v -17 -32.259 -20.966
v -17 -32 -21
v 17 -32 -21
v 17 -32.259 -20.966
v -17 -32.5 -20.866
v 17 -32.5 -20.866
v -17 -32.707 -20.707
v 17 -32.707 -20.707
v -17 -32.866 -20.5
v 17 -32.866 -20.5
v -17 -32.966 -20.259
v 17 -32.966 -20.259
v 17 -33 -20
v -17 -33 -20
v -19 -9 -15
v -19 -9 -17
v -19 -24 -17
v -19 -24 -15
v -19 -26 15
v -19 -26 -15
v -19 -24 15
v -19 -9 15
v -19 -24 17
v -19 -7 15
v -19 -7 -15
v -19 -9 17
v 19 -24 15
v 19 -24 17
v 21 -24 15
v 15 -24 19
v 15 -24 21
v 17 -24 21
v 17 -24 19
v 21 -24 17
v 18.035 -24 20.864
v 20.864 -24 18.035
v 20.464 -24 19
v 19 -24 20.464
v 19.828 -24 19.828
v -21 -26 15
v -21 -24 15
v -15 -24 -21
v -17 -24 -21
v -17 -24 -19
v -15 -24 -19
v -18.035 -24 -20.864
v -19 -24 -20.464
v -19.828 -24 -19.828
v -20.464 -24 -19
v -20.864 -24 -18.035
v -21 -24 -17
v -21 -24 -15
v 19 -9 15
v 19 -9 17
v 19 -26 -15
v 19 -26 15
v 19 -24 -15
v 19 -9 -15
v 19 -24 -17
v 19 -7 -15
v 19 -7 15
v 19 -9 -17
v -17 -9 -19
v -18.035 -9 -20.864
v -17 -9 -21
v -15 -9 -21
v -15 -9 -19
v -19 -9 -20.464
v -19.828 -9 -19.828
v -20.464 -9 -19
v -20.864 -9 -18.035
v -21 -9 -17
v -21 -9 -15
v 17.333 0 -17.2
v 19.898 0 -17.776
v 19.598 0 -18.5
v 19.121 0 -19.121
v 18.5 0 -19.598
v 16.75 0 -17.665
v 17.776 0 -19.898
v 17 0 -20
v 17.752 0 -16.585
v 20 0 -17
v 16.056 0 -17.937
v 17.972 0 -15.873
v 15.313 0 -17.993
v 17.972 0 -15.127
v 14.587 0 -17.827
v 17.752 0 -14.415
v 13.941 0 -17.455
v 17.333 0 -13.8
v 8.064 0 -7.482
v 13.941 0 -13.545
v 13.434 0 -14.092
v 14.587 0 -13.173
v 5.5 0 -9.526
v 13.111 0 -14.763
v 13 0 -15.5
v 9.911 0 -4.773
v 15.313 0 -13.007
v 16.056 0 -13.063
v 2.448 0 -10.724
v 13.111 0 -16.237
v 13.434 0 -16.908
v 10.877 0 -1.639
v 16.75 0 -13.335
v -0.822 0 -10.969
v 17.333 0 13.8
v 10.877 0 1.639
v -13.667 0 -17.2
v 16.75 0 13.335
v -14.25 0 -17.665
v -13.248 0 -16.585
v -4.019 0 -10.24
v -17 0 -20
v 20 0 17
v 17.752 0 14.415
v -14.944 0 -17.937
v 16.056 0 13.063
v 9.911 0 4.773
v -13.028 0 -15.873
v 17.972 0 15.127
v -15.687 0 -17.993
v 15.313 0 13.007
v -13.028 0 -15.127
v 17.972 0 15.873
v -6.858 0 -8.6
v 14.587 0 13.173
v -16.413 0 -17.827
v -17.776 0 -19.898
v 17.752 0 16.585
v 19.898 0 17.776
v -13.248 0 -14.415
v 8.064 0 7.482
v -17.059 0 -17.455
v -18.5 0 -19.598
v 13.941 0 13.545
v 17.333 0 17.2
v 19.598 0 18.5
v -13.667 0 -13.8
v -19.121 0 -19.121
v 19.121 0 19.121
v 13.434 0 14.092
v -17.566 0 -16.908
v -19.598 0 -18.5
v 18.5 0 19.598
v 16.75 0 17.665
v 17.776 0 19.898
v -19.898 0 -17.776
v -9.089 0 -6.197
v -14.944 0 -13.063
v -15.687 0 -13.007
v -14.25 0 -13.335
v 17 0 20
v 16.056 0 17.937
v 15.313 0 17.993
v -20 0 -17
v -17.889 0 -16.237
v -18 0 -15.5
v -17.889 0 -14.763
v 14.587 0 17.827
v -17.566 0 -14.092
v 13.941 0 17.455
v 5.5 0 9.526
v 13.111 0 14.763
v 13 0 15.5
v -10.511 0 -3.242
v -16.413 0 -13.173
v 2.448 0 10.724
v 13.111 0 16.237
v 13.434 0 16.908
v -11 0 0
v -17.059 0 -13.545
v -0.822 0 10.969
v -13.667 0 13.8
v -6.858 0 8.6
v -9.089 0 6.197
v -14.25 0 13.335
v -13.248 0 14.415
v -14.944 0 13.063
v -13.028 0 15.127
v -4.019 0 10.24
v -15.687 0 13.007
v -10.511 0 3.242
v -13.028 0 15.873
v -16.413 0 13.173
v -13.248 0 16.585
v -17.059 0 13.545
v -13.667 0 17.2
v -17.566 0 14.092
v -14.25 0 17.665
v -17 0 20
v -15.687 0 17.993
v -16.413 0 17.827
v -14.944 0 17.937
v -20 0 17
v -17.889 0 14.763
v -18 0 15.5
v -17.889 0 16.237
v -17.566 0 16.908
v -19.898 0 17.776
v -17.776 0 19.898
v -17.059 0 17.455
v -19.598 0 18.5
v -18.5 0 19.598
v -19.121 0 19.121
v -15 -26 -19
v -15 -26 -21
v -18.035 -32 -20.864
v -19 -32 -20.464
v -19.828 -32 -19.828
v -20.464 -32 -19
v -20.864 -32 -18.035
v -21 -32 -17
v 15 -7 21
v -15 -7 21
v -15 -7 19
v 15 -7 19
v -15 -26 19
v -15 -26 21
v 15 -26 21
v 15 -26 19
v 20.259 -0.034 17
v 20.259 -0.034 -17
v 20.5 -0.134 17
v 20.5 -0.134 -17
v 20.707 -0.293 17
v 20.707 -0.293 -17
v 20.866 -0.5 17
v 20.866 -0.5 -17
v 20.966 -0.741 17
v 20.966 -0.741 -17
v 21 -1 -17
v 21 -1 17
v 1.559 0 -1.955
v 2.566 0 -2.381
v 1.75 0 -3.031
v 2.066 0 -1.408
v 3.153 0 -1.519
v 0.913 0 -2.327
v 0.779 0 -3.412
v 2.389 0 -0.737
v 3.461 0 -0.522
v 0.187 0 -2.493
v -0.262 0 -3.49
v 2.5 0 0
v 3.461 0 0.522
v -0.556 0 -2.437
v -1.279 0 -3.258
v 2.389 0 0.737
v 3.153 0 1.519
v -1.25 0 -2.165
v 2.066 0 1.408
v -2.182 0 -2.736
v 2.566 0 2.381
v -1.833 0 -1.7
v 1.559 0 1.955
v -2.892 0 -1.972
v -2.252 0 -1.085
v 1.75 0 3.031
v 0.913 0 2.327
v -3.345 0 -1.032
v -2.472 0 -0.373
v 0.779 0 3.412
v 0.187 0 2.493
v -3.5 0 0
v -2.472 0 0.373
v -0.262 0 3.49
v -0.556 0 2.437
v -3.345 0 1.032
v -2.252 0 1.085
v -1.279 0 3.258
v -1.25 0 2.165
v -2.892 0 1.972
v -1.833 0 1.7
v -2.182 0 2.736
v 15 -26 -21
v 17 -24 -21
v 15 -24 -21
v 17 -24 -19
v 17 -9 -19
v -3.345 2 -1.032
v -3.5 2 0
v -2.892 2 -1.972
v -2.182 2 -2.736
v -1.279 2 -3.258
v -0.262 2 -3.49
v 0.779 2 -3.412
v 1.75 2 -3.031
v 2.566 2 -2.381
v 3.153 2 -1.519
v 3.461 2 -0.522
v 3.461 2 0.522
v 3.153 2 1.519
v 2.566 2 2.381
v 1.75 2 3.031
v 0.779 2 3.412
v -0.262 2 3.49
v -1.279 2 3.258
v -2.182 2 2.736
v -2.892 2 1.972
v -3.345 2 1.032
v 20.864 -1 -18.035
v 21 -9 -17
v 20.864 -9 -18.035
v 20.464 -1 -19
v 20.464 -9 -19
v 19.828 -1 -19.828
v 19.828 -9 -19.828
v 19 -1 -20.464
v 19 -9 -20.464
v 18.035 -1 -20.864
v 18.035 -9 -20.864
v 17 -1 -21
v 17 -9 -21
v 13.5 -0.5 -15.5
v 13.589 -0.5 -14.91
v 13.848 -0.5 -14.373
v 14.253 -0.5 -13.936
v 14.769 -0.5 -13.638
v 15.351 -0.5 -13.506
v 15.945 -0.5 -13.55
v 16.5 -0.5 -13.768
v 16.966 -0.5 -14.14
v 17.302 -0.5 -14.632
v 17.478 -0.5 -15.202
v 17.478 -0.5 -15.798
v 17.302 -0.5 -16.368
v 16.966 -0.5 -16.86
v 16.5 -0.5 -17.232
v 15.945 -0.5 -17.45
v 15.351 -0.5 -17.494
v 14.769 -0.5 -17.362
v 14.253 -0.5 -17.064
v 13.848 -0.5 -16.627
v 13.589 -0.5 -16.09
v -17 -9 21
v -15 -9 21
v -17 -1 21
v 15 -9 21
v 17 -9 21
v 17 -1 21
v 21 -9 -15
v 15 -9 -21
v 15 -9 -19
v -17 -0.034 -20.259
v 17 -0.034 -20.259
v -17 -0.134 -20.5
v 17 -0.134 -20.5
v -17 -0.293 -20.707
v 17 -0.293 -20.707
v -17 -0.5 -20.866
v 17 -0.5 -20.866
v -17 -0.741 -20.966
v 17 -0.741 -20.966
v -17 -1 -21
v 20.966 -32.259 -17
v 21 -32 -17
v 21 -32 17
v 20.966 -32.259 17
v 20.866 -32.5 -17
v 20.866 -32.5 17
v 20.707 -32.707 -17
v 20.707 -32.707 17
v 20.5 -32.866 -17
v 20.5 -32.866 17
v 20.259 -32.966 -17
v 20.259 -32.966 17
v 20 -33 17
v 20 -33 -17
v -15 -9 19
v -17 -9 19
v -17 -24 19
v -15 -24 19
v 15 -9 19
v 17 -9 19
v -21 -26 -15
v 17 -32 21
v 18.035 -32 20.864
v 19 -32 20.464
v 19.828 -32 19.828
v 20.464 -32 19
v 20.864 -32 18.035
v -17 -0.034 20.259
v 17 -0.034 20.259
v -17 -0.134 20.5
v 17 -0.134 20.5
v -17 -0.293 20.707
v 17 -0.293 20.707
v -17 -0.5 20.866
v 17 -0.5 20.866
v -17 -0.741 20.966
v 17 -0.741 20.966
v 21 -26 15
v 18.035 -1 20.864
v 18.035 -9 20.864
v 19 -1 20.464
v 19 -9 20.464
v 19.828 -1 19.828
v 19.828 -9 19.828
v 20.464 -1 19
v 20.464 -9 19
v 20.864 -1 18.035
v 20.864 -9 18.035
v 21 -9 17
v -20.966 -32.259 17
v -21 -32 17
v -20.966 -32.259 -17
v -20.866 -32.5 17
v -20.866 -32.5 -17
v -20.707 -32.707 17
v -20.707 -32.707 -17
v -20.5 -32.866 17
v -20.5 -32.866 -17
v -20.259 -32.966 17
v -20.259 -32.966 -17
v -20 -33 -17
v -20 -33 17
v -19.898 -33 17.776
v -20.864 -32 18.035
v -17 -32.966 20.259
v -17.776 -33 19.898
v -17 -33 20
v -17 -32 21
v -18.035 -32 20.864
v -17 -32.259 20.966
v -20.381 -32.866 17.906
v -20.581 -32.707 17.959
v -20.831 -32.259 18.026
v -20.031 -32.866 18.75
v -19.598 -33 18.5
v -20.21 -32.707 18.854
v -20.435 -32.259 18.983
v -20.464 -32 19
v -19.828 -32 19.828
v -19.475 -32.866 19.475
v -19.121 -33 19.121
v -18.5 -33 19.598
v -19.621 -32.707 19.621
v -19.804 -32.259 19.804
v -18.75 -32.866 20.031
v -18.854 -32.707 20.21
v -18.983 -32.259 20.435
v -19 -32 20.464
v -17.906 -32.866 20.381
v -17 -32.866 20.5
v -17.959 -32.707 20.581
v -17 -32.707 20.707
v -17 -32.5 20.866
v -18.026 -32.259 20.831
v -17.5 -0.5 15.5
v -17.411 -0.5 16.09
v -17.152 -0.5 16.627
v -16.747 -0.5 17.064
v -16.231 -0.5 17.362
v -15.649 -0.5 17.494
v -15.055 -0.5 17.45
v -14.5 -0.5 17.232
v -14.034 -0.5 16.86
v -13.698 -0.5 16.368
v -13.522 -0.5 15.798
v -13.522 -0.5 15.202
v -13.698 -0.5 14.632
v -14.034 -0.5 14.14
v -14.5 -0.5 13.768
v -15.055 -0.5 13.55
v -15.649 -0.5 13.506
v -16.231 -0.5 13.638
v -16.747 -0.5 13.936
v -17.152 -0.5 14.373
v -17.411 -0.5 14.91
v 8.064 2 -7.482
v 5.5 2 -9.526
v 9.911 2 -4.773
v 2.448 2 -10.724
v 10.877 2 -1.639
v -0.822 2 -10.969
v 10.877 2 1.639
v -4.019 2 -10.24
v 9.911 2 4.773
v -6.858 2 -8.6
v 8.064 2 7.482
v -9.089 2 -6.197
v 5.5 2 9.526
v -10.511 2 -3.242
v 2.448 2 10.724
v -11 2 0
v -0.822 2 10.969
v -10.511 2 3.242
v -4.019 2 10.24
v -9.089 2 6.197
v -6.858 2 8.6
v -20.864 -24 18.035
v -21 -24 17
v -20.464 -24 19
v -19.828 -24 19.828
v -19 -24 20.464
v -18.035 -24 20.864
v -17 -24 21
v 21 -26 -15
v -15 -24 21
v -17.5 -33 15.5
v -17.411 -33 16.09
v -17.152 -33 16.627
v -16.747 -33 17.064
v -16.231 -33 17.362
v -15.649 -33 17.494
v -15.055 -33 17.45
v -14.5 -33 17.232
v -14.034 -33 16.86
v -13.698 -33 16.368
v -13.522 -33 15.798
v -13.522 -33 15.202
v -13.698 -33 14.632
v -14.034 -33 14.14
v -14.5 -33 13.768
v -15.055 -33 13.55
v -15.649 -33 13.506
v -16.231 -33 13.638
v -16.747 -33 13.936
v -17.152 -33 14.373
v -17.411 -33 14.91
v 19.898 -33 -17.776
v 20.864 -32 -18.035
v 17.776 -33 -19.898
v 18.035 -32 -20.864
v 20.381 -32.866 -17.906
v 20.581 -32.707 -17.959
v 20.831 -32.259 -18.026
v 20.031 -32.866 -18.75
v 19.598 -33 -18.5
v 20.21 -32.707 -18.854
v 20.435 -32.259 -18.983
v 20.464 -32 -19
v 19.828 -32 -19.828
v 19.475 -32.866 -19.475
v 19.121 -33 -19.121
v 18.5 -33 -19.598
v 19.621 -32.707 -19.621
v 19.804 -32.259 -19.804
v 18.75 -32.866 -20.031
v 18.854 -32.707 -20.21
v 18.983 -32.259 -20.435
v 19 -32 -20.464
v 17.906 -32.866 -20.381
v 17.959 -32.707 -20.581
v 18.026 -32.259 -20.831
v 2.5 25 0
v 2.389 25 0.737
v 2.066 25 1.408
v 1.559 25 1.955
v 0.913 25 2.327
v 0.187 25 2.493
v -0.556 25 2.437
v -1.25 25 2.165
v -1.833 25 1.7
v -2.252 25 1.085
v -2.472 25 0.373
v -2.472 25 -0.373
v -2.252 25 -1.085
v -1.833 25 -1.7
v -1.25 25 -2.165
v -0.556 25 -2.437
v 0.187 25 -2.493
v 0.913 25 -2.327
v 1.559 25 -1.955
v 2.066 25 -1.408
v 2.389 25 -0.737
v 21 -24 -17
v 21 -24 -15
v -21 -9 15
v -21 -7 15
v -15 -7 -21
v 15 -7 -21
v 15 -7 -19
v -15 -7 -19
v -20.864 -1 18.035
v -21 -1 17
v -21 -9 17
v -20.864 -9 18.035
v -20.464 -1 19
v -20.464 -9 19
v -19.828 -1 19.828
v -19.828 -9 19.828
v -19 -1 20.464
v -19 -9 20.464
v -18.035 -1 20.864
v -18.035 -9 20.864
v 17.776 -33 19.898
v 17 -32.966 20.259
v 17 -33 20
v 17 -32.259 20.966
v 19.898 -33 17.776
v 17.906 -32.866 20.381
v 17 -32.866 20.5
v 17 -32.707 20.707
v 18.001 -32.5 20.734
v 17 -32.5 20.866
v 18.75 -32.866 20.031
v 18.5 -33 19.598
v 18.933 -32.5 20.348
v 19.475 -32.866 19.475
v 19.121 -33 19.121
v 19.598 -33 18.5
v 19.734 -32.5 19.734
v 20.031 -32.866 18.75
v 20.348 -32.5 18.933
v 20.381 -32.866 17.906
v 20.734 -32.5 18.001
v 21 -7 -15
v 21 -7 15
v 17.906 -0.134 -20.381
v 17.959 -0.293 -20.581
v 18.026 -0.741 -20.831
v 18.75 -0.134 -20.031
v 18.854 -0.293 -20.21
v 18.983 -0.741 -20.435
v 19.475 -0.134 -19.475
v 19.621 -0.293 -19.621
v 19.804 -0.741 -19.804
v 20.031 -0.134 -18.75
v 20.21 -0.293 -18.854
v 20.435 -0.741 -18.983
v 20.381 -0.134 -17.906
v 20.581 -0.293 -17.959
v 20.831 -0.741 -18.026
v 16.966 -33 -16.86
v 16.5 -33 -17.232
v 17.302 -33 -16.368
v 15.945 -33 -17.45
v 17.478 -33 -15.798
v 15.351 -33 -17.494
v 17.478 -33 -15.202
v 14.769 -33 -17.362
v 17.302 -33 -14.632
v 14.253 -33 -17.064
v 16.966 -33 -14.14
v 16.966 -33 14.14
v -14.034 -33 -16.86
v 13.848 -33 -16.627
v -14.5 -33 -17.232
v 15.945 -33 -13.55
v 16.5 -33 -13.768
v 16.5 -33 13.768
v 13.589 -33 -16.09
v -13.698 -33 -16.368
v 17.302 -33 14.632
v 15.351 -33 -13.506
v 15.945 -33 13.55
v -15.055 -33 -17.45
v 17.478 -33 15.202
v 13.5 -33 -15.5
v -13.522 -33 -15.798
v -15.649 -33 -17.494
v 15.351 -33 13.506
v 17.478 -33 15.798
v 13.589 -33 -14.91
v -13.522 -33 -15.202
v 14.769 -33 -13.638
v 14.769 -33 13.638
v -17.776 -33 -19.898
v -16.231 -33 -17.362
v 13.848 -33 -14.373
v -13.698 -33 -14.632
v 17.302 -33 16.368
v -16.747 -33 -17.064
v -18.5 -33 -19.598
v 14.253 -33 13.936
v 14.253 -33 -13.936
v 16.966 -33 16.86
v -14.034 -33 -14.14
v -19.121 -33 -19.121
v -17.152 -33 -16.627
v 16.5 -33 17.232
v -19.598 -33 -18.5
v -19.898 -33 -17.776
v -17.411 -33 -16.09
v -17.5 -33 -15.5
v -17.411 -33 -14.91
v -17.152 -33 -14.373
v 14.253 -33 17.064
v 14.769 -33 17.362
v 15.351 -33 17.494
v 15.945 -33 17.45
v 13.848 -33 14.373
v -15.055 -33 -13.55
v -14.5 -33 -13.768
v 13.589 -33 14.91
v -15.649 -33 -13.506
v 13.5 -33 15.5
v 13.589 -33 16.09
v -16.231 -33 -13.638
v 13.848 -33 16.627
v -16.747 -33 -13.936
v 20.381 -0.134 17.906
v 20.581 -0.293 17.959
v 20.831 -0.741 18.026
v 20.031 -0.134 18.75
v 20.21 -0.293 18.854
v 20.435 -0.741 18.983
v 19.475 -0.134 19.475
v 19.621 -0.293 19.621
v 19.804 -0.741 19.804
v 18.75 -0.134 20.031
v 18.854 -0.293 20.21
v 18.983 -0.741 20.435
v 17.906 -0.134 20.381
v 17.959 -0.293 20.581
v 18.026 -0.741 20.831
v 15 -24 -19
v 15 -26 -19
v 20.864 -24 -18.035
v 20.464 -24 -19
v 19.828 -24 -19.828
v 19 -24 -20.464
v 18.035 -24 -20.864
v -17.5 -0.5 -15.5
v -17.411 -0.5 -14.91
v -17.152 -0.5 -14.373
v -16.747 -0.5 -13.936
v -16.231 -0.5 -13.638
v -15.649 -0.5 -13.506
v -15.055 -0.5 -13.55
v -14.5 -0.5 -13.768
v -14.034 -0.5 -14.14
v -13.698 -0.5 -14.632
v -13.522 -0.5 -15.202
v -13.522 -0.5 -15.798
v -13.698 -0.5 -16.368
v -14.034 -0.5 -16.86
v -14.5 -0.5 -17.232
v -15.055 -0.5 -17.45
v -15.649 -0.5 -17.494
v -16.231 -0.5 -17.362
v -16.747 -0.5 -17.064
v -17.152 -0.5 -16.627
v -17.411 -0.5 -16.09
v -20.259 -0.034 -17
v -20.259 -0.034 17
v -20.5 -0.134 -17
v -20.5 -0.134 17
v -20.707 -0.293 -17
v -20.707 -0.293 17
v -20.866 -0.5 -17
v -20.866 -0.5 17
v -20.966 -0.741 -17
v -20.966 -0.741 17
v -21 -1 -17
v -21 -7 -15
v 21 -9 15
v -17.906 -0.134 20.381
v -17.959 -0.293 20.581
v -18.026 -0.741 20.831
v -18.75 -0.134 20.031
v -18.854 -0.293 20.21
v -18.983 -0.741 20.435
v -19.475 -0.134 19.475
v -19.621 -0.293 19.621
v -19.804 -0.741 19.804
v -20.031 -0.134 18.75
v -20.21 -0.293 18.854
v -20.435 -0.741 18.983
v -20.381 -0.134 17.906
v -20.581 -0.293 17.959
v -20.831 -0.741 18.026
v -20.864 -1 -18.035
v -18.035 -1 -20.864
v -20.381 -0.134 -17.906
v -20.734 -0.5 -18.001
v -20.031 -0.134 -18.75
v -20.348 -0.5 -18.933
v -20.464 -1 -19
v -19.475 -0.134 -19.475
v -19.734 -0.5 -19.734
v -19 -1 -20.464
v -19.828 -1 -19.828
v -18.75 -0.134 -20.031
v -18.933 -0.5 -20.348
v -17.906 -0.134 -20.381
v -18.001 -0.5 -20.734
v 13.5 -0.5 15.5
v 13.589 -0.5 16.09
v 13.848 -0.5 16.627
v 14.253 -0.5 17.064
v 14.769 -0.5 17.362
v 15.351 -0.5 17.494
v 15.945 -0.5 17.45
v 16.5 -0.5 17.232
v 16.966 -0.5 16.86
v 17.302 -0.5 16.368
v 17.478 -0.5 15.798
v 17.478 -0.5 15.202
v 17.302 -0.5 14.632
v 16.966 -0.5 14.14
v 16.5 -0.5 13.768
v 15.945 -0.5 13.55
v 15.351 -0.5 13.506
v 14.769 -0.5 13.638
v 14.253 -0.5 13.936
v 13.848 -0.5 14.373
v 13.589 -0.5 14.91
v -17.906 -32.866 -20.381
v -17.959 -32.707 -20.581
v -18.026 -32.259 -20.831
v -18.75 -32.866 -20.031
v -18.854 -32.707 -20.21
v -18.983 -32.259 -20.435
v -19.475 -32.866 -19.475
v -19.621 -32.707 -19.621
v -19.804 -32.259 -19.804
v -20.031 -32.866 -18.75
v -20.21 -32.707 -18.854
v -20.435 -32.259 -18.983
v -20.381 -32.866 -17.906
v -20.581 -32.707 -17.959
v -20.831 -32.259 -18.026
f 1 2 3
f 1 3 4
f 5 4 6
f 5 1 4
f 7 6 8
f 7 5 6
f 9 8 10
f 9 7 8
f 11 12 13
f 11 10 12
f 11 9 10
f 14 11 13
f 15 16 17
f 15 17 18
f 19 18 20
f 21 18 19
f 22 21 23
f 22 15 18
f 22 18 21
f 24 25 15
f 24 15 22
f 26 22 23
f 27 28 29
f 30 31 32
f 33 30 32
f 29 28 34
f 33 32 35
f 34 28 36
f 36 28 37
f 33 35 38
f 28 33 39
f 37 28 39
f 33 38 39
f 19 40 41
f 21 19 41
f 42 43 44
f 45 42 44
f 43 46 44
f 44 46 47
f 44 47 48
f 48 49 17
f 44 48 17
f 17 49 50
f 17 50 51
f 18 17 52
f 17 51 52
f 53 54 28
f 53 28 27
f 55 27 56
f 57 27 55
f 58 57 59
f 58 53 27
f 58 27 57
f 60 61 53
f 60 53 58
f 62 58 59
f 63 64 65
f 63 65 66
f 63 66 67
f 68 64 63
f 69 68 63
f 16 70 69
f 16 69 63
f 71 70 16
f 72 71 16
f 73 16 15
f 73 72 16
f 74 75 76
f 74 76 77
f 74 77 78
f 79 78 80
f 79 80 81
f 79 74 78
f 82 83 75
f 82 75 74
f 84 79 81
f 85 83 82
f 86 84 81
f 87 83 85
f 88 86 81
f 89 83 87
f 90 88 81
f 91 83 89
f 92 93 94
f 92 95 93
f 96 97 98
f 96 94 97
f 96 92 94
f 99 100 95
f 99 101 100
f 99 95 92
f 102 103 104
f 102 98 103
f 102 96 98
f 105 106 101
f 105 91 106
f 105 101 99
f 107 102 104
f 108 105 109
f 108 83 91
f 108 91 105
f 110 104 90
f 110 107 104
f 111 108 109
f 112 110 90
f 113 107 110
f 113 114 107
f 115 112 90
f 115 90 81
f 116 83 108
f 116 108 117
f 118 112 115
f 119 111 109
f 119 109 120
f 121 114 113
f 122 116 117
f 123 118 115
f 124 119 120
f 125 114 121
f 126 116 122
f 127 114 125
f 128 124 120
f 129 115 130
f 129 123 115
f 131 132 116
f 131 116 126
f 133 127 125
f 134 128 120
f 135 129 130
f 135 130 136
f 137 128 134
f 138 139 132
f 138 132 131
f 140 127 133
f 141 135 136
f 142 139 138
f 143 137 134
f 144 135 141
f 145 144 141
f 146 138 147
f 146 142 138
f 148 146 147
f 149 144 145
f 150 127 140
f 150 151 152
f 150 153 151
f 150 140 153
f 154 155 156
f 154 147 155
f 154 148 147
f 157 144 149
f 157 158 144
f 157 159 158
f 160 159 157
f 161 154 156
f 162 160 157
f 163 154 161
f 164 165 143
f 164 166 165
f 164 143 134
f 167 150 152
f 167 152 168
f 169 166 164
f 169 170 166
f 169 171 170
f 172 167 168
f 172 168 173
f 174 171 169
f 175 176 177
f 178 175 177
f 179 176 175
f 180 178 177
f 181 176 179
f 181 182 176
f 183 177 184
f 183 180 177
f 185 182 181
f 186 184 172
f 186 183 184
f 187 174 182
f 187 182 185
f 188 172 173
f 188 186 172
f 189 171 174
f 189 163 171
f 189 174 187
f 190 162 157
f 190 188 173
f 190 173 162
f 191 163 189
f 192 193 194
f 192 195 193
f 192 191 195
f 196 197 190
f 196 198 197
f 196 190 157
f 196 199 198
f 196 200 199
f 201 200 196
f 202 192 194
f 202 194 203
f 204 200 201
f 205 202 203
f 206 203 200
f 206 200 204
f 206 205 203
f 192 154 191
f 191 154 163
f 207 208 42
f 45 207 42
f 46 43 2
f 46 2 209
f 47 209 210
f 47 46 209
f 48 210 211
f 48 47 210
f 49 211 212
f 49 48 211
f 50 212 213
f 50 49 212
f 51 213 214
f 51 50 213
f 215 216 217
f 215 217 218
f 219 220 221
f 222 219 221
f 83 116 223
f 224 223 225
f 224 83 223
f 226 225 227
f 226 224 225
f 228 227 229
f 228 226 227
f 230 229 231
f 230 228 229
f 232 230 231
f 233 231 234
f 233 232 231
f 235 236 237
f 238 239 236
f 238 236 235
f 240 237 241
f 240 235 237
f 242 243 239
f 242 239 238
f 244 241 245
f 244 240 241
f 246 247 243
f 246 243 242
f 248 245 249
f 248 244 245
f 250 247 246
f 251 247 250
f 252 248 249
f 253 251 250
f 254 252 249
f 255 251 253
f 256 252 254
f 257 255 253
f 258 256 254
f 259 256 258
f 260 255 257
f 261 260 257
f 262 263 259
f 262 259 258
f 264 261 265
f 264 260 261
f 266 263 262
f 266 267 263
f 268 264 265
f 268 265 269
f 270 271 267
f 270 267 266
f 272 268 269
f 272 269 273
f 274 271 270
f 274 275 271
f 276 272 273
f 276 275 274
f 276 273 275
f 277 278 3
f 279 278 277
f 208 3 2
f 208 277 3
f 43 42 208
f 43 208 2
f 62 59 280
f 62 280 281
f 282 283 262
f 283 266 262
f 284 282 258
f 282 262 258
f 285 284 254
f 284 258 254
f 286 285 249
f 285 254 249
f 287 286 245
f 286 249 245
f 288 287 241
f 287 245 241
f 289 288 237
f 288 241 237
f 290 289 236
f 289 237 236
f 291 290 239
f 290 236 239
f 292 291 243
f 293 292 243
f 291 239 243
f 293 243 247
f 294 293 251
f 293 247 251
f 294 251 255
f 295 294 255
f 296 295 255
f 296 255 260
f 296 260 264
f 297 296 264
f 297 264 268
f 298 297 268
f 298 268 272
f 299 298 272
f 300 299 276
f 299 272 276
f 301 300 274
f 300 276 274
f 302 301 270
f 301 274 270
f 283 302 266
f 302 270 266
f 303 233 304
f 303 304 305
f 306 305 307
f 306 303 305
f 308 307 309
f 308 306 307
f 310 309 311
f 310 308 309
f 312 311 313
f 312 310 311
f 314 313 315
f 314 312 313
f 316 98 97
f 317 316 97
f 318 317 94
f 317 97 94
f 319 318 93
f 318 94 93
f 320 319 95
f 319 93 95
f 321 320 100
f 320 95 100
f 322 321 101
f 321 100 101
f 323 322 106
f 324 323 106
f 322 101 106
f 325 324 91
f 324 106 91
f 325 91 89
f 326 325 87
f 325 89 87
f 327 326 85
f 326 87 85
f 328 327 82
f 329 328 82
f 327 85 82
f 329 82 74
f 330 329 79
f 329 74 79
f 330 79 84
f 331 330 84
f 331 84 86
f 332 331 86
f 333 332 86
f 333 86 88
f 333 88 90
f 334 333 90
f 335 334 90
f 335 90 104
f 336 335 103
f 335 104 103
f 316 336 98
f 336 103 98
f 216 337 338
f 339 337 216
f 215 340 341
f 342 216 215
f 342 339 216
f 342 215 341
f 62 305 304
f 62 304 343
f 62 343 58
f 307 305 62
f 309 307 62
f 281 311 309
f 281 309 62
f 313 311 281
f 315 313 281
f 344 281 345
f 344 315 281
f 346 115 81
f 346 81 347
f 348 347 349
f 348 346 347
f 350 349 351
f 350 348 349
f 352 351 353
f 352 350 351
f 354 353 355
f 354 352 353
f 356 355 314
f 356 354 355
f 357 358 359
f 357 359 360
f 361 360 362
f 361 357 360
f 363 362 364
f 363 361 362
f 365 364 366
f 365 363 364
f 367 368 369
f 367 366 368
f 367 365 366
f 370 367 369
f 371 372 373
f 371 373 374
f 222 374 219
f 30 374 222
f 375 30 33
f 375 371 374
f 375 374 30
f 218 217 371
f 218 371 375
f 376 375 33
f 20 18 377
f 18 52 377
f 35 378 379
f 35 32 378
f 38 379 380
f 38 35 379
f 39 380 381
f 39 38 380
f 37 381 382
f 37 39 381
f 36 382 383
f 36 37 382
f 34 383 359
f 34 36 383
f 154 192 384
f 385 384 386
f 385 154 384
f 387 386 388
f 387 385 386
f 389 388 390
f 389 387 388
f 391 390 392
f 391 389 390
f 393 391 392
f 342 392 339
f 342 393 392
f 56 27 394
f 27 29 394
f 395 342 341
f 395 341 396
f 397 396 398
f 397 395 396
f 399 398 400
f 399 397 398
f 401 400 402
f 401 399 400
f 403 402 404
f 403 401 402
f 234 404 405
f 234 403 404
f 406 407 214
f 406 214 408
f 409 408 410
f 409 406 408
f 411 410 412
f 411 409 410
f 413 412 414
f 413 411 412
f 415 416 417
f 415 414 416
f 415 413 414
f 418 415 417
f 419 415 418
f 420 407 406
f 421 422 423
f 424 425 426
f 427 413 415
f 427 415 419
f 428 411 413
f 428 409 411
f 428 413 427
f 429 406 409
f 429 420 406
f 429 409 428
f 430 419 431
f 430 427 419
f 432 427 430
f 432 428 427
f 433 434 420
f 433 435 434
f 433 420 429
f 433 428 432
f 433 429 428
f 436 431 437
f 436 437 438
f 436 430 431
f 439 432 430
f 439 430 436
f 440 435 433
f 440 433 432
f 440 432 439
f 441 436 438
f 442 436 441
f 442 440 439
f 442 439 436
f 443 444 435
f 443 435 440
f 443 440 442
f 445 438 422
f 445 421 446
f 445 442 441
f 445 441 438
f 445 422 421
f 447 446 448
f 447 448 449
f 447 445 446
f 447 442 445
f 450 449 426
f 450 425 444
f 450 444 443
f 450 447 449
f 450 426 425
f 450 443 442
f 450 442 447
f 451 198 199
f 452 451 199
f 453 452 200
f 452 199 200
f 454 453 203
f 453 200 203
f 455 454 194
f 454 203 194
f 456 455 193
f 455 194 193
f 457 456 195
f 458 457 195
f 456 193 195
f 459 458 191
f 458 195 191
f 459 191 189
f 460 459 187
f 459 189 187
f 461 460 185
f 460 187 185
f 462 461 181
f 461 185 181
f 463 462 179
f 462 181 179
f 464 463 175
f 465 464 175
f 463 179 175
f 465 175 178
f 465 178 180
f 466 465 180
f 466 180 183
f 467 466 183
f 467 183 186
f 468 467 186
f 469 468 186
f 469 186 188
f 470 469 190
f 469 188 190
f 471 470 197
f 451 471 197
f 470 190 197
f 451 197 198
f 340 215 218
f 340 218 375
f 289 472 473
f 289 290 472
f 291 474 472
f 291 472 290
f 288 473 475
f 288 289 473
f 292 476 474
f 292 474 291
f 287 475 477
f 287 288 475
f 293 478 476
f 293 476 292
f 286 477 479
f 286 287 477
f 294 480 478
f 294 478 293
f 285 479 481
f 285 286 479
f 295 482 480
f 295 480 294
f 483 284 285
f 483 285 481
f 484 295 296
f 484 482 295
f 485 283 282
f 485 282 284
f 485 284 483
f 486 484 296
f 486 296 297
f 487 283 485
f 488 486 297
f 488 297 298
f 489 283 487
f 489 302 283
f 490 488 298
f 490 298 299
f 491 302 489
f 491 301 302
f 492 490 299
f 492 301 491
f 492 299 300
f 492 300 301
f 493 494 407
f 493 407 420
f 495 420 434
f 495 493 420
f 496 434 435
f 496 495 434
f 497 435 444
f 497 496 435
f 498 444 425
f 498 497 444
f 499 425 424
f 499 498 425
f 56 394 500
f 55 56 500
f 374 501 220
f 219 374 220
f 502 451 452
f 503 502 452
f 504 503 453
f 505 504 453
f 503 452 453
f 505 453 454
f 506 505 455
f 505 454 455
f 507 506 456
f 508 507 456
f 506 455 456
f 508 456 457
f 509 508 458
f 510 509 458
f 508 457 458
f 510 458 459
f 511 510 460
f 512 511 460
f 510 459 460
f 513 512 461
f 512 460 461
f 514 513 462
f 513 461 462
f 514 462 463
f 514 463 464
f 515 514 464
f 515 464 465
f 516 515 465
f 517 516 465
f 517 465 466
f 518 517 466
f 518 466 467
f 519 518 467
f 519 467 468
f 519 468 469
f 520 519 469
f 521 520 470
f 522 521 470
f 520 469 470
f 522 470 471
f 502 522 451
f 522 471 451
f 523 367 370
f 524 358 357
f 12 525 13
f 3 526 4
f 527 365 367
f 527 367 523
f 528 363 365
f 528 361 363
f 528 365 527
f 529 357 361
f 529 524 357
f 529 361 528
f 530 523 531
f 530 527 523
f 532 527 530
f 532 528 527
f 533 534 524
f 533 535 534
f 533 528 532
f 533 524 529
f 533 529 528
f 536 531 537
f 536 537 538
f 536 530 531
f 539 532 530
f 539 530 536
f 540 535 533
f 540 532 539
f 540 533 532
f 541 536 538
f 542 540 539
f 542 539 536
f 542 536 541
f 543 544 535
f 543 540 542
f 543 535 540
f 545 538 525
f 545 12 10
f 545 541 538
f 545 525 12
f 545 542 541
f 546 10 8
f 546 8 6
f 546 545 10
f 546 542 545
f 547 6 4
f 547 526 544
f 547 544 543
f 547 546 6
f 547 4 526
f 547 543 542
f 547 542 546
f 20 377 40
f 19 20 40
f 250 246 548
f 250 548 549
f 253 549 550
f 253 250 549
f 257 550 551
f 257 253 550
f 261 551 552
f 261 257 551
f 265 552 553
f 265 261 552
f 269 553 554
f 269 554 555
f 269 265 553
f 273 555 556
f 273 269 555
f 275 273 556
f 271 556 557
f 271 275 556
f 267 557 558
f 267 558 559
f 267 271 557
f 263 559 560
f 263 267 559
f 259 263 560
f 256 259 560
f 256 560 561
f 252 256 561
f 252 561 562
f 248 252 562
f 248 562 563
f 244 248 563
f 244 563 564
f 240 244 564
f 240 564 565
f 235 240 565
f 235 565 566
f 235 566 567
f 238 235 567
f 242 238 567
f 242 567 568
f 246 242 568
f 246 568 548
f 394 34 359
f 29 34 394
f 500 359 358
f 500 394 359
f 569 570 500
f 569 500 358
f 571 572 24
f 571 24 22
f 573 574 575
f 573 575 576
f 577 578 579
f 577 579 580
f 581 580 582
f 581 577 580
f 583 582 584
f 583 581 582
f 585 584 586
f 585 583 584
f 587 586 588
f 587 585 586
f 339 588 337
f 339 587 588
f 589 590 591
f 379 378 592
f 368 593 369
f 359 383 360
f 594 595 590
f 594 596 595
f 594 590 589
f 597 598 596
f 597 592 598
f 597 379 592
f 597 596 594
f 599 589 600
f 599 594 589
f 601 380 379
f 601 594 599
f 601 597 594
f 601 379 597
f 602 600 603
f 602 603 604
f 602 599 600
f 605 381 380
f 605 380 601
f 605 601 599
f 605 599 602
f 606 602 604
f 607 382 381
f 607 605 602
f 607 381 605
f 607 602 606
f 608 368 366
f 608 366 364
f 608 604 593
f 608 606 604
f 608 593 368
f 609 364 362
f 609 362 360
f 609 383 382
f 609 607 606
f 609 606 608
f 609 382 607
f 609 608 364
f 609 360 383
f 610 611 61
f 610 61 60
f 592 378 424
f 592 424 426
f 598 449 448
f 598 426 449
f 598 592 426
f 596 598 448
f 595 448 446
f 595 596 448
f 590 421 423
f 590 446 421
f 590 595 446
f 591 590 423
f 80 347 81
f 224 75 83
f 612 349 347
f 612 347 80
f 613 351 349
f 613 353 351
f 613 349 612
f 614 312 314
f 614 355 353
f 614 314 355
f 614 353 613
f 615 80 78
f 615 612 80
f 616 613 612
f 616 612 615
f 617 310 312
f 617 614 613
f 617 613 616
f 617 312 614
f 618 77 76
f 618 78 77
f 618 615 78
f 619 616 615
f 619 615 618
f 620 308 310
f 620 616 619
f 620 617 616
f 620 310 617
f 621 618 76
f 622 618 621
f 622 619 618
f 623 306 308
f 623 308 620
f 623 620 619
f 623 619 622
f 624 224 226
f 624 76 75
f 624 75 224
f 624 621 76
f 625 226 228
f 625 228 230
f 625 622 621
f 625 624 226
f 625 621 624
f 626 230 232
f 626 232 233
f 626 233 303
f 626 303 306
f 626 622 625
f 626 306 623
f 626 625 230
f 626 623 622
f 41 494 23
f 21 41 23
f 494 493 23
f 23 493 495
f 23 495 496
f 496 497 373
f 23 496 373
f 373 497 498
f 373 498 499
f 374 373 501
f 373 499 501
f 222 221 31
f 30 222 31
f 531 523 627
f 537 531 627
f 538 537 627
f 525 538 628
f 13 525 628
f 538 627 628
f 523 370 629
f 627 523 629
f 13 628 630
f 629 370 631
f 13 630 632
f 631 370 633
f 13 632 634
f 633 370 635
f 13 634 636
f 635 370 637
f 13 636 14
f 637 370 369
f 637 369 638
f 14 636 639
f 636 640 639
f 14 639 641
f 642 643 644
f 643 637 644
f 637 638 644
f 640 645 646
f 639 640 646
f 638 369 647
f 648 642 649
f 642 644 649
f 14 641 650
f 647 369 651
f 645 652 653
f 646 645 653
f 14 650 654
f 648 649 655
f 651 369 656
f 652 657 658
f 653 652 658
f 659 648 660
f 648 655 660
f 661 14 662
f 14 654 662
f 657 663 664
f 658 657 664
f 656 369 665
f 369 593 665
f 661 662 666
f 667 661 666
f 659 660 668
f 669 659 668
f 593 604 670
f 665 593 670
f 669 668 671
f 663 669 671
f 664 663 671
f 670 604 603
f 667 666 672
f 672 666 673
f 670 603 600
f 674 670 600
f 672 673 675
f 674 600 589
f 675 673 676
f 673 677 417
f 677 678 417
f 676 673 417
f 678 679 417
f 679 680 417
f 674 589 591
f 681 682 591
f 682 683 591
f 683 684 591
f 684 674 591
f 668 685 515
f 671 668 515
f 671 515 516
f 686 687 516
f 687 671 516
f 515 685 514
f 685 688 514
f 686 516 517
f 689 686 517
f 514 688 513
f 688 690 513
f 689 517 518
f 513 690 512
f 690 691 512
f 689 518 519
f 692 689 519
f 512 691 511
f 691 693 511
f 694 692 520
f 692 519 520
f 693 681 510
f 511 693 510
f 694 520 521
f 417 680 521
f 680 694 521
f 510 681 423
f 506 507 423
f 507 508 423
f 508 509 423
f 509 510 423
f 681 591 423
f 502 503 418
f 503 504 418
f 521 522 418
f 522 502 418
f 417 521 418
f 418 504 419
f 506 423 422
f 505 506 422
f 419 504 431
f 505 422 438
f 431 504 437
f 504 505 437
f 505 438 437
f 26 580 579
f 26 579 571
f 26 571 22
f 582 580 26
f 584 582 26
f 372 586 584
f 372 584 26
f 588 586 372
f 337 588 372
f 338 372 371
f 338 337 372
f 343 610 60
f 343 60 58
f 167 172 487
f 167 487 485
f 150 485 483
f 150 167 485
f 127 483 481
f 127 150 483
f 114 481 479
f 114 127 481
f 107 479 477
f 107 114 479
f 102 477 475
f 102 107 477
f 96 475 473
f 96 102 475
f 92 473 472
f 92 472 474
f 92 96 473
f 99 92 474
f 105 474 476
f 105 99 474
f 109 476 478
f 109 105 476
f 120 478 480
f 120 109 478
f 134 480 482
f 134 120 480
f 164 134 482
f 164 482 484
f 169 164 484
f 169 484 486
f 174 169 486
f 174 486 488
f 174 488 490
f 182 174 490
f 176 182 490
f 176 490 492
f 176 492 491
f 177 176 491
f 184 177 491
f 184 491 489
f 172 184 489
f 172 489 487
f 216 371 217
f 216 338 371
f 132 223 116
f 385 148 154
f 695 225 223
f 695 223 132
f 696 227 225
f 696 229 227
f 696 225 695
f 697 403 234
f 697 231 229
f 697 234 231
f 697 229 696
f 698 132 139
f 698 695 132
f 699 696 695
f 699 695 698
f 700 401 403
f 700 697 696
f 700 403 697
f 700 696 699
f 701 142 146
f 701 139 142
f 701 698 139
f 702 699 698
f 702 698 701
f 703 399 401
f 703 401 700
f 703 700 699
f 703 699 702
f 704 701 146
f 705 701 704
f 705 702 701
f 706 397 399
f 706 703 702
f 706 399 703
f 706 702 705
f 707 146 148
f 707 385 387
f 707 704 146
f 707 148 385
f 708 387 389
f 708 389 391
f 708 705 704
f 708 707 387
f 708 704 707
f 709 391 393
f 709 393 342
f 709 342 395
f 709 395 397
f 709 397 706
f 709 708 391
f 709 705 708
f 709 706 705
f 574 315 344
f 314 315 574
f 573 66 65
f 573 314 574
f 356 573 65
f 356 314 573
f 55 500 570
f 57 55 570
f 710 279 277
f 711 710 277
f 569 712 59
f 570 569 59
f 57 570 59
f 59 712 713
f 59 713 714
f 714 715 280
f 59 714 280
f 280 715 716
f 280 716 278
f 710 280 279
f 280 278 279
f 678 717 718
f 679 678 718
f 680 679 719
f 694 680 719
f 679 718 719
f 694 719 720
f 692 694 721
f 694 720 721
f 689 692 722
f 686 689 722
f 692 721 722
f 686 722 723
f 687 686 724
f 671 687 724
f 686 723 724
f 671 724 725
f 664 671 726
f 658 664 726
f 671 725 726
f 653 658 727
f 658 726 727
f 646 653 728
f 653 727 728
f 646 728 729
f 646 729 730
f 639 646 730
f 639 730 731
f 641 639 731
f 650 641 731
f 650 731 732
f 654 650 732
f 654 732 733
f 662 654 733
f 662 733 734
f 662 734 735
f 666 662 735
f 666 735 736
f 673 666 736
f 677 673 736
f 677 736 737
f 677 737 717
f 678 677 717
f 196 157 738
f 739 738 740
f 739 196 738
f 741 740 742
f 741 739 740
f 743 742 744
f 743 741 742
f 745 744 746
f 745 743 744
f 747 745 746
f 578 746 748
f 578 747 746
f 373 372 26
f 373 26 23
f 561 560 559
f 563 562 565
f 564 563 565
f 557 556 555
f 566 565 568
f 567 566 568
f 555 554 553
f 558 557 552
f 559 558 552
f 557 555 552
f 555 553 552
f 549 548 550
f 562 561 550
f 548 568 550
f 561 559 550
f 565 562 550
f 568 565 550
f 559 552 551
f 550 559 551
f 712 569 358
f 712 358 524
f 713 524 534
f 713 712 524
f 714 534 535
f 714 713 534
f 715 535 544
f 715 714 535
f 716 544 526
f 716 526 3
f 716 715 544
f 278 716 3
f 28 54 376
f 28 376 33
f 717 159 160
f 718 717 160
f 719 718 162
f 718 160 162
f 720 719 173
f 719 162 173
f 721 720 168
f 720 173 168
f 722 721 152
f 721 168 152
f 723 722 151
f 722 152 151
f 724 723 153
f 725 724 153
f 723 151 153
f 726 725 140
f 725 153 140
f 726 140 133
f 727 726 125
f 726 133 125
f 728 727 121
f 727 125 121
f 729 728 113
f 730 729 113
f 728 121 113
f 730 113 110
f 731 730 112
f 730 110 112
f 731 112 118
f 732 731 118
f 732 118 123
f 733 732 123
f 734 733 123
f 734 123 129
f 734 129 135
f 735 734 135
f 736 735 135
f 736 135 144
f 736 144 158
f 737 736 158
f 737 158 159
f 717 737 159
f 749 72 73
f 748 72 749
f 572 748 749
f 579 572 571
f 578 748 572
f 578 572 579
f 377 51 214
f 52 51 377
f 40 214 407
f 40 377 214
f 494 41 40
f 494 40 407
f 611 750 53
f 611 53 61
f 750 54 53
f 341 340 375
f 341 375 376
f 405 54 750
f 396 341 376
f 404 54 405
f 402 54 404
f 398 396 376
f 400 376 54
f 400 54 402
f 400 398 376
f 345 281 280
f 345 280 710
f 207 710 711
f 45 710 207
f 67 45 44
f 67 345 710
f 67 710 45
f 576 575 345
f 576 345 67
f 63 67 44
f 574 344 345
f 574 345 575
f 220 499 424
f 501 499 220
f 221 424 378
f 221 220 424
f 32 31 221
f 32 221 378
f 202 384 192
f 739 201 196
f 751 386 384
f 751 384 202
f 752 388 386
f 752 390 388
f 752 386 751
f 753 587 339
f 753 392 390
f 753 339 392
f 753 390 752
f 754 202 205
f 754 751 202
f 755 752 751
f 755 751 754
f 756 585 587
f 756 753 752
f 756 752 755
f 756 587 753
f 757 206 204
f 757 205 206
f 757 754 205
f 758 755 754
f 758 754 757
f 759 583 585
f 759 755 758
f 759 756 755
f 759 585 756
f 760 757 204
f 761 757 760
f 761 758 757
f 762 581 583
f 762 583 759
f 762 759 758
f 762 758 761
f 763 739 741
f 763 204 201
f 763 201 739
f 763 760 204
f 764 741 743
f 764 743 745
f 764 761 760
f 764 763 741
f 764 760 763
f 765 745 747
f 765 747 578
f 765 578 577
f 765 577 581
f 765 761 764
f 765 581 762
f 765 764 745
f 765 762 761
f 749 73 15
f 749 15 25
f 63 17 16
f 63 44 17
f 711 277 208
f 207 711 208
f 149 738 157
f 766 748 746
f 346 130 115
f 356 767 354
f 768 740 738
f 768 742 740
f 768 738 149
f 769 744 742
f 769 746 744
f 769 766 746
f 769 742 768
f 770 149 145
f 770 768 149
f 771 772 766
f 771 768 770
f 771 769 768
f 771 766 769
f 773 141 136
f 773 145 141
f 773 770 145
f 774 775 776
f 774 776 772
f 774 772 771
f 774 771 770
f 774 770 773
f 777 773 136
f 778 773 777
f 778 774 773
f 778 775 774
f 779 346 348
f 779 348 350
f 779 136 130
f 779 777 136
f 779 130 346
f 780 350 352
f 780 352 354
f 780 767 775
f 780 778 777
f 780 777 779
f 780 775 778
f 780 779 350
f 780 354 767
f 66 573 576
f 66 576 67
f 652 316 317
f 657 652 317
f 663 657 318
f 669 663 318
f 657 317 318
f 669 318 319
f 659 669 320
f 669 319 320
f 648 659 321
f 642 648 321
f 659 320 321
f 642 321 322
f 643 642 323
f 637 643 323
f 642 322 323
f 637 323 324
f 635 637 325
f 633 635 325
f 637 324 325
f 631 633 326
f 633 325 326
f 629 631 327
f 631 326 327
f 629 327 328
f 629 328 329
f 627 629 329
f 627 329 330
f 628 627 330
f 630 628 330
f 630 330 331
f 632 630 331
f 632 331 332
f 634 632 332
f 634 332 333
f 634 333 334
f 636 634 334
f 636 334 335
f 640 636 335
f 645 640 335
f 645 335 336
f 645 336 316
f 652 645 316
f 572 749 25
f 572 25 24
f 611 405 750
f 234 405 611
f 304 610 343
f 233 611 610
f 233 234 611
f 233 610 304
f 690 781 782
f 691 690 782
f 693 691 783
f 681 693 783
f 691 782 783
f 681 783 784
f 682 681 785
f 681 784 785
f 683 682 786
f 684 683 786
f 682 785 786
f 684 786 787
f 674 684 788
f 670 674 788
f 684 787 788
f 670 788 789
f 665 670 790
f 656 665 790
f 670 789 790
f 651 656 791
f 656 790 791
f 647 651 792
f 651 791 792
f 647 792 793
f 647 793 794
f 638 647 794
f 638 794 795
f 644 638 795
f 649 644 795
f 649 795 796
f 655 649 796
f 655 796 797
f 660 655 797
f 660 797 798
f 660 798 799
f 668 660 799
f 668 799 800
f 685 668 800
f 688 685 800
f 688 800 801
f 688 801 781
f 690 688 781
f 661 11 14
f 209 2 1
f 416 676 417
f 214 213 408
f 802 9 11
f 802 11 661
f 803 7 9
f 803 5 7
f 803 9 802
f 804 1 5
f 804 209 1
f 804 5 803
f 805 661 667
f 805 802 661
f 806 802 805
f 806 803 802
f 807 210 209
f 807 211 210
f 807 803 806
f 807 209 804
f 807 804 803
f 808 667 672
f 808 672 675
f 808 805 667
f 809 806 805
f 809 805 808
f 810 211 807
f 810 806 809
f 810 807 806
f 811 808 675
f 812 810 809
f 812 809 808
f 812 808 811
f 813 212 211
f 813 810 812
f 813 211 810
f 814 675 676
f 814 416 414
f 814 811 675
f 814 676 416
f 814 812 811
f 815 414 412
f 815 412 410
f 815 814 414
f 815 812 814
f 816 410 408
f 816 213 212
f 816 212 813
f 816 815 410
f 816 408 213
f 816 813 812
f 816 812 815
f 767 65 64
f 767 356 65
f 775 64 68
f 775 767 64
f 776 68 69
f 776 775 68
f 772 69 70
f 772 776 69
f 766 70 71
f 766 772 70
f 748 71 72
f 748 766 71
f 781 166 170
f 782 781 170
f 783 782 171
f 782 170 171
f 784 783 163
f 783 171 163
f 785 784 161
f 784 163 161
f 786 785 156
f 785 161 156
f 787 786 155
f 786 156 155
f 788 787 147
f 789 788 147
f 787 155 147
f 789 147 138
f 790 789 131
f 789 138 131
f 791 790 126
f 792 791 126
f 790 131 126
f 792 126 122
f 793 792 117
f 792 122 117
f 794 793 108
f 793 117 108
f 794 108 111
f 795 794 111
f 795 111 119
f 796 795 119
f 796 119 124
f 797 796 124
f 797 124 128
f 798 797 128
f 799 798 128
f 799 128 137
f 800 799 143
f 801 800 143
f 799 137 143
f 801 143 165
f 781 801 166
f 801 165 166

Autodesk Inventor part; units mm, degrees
ref_plane "YZ Plane" through (0, 0, 0) normal (1, 0, 0) x (0, 1, 0)
ref_plane "XZ Plane" through (0, 0, 0) normal (0, 1, 0) x (-1, 0, 0)
ref_plane "XY Plane" through (0, 0, 0) normal (0, 0, 1) x (1, 0, 0)
sketch "Sketch1" plane through (0, 0, 0) normal (0, 1, 0) x (-1, 0, 0)
  line L0 (17, 21) -> (-17, 21)
  line L1 (-21, 17) -> (-21, -17)
  line L2 (-17, -21) -> (17, -21)
  line L3 (21, -17) -> (21, 17)
  line L4 (0, -30.5598) -> (0, 30.5598) projected
  line L5 (-30.5598, 0) -> (30.5598, 0) projected
  circle A0 centre (0, 0) radius 2.5
  circle A1 centre (0, 0) radius 3.5
  circle A2 centre (0, 0) radius 11
  circle A3 centre (15.5, 15.5) radius 2
  circle A4 centre (15.5, -15.5) radius 2
  circle A5 centre (-15.5, -15.5) radius 2
  circle A6 centre (-15.5, 15.5) radius 2
  arc A7 (21, 17) -> (17, 21) centre (17, 17) ccw
  arc A8 (17, -21) -> (21, -17) centre (17, -17) ccw
  arc A9 (-21, -17) -> (-17, -21) centre (-17, -17) ccw
  arc A10 (-17, 21) -> (-21, 17) centre (-17, 17) ccw
  point P0 (21, 21)
  point P1 (21, -21)
  dimension "d0" = 5
  dimension "d1" = 7
  dimension "d2" = 22
  dimension "d3" = 42
  dimension "d4" = 4
  dimension "d5" = 31
  dimension "d6" = 31
  dimension "d7" = 4
extrude "Extrusion1" add sketch "Sketch1" against normal blind 33 contours A7 L3 L5 A2 L4 L0 | L4 A2 L5 L1 A10 L0 | A2 L5 A1 L4 | L4 A1 L5 A2 | L3 A8 L2 L4 A2 L5 | A1 L5 A0 L4 | L4 A0 L5 A1 | A2 L4 A1 L5 | A2 L4 L2 A9 L1 L5 | L5 A1 L4 A2 | A1 L4 A0 L5 | L5 A0 L4 A1
extrude "Extrusion2" add sketch "Sketch1" along normal blind 2 contours A2 L5 A1 L4 | L4 A1 L5 A2 | A2 L4 A1 L5 | L5 A1 L4 A2
sketch "Sketch2" plane through (21, 0, 17) normal (1, 0, 0) x (0, 0, -1)
  line L0 (-4, 0) -> (0, 0) projected
  line L1 (0, -34) -> (-4, -34) projected
  line L2 (0, 0) -> (34, 0) projected
  line L3 (34, -33) -> (0, -33) projected
  line L4 (34, 0) -> (38, 0) projected
  line L5 (38, -34) -> (34, -34) projected
  line L6 (-4, -9) -> (2, -9)
  line L7 (2, -9) -> (2, -7)
  line L8 (2, -7) -> (32, -7)
  line L9 (32, -7) -> (32, -9)
  line L10 (32, -9) -> (38, -9)
  line L11 (-4, 0) -> (-4, -33) projected
  line L12 (-4, -24) -> (2, -24)
  line L13 (2, -24) -> (2, -26)
  line L14 (2, -26) -> (32, -26)
  line L15 (32, -26) -> (32, -24)
  line L16 (32, -24) -> (38, -24)
  line L17 (38, 0) -> (38, -33) projected
  line L18 (-4, -16.5) -> (38, -16.5) construction
  line L19 (-4, 0) -> (-4, -9)
  line L20 (-4, -24) -> (-4, -33)
  line L21 (38, 0) -> (38, -9)
  line L22 (38, -24) -> (38, -33)
  line L23 (17, -40.8) -> (17, 6.8) construction
  line L24 (-4, -9) -> (-4, -24)
  line L25 (38, -24) -> (38, -9)
  point P0 (17, 0)
  dimension "d12" = 6
  dimension "d13" = 7
  dimension "d14" = 2
extrude "Extrusion3" cut sketch "Sketch2" against normal blind 2 contours L6 L7 L8 L9 L10 L17 L16 L15 L14 L13 L12 L11
pattern_circular "Circular Pattern1" count 4 over 360 about axis through (0, 0, 0) along (0, -1, 0) of "Extrusion3"
chamfer "Chamfer1" distance 2 angle 45 4 edges at (-19, -16.5, 19) (-19, -16.5, -19) (19, -16.5, 19) (19, -16.5, -19)
sketch "Sketch3" plane through (0, -33, 0) normal (0, -1, 0) x (1, 0, 0)
  circle A0 centre (0, 0) radius 2.5 projected
  circle A1 centre (15.5, 15.5) radius 2 projected
  circle A2 centre (15.5, -15.5) radius 2 projected
  circle A3 centre (-15.5, -15.5) radius 2 projected
  circle A4 centre (-15.5, 15.5) radius 2 projected
  line L0 (17, 21) -> (-17, 21) projected
  arc A5 (-17, 21) -> (-21, 17) centre (-17, 17) ccw projected
  line L1 (-21, 17) -> (-21, -17) projected
  arc A6 (-21, -17) -> (-17, -21) centre (-17, -17) ccw projected
  line L2 (-17, -21) -> (17, -21) projected
  arc A7 (17, -21) -> (21, -17) centre (17, -17) ccw projected
  line L3 (21, -17) -> (21, 17) projected
  arc A8 (21, 17) -> (17, 21) centre (17, 17) ccw projected
extrude "Extrusion4" add sketch "Sketch3" against normal blind 58 contours A0
chamfer "Chamfer2" distance 0.5 angle 45 4 edges at (-13.5, 0, -15.5) (-13.5, 0, 15.5) (17.5, 0, 15.5) (17.5, 0, -15.5)
fillet "Fillet1" radius 1 16 edges at (-19.8284, 0, -19.8284) (-21, 0, 0) (-19.8284, 0, 19.8284) (0, 0, 21) (19.8284, 0, 19.8284) (21, 0, 0) (19.8284, 0, -19.8284) (0, 0, -21) (19.8284, -33, 19.8284) (0, -33, 21) (-19.8284, -33, 19.8284) (-21, -33, 0) (-19.8284, -33, -19.8284) (0, -33, -21) (19.8284, -33, -19.8284) (21, -33, 0)
properties part number "NEMA 17 Stepper"
